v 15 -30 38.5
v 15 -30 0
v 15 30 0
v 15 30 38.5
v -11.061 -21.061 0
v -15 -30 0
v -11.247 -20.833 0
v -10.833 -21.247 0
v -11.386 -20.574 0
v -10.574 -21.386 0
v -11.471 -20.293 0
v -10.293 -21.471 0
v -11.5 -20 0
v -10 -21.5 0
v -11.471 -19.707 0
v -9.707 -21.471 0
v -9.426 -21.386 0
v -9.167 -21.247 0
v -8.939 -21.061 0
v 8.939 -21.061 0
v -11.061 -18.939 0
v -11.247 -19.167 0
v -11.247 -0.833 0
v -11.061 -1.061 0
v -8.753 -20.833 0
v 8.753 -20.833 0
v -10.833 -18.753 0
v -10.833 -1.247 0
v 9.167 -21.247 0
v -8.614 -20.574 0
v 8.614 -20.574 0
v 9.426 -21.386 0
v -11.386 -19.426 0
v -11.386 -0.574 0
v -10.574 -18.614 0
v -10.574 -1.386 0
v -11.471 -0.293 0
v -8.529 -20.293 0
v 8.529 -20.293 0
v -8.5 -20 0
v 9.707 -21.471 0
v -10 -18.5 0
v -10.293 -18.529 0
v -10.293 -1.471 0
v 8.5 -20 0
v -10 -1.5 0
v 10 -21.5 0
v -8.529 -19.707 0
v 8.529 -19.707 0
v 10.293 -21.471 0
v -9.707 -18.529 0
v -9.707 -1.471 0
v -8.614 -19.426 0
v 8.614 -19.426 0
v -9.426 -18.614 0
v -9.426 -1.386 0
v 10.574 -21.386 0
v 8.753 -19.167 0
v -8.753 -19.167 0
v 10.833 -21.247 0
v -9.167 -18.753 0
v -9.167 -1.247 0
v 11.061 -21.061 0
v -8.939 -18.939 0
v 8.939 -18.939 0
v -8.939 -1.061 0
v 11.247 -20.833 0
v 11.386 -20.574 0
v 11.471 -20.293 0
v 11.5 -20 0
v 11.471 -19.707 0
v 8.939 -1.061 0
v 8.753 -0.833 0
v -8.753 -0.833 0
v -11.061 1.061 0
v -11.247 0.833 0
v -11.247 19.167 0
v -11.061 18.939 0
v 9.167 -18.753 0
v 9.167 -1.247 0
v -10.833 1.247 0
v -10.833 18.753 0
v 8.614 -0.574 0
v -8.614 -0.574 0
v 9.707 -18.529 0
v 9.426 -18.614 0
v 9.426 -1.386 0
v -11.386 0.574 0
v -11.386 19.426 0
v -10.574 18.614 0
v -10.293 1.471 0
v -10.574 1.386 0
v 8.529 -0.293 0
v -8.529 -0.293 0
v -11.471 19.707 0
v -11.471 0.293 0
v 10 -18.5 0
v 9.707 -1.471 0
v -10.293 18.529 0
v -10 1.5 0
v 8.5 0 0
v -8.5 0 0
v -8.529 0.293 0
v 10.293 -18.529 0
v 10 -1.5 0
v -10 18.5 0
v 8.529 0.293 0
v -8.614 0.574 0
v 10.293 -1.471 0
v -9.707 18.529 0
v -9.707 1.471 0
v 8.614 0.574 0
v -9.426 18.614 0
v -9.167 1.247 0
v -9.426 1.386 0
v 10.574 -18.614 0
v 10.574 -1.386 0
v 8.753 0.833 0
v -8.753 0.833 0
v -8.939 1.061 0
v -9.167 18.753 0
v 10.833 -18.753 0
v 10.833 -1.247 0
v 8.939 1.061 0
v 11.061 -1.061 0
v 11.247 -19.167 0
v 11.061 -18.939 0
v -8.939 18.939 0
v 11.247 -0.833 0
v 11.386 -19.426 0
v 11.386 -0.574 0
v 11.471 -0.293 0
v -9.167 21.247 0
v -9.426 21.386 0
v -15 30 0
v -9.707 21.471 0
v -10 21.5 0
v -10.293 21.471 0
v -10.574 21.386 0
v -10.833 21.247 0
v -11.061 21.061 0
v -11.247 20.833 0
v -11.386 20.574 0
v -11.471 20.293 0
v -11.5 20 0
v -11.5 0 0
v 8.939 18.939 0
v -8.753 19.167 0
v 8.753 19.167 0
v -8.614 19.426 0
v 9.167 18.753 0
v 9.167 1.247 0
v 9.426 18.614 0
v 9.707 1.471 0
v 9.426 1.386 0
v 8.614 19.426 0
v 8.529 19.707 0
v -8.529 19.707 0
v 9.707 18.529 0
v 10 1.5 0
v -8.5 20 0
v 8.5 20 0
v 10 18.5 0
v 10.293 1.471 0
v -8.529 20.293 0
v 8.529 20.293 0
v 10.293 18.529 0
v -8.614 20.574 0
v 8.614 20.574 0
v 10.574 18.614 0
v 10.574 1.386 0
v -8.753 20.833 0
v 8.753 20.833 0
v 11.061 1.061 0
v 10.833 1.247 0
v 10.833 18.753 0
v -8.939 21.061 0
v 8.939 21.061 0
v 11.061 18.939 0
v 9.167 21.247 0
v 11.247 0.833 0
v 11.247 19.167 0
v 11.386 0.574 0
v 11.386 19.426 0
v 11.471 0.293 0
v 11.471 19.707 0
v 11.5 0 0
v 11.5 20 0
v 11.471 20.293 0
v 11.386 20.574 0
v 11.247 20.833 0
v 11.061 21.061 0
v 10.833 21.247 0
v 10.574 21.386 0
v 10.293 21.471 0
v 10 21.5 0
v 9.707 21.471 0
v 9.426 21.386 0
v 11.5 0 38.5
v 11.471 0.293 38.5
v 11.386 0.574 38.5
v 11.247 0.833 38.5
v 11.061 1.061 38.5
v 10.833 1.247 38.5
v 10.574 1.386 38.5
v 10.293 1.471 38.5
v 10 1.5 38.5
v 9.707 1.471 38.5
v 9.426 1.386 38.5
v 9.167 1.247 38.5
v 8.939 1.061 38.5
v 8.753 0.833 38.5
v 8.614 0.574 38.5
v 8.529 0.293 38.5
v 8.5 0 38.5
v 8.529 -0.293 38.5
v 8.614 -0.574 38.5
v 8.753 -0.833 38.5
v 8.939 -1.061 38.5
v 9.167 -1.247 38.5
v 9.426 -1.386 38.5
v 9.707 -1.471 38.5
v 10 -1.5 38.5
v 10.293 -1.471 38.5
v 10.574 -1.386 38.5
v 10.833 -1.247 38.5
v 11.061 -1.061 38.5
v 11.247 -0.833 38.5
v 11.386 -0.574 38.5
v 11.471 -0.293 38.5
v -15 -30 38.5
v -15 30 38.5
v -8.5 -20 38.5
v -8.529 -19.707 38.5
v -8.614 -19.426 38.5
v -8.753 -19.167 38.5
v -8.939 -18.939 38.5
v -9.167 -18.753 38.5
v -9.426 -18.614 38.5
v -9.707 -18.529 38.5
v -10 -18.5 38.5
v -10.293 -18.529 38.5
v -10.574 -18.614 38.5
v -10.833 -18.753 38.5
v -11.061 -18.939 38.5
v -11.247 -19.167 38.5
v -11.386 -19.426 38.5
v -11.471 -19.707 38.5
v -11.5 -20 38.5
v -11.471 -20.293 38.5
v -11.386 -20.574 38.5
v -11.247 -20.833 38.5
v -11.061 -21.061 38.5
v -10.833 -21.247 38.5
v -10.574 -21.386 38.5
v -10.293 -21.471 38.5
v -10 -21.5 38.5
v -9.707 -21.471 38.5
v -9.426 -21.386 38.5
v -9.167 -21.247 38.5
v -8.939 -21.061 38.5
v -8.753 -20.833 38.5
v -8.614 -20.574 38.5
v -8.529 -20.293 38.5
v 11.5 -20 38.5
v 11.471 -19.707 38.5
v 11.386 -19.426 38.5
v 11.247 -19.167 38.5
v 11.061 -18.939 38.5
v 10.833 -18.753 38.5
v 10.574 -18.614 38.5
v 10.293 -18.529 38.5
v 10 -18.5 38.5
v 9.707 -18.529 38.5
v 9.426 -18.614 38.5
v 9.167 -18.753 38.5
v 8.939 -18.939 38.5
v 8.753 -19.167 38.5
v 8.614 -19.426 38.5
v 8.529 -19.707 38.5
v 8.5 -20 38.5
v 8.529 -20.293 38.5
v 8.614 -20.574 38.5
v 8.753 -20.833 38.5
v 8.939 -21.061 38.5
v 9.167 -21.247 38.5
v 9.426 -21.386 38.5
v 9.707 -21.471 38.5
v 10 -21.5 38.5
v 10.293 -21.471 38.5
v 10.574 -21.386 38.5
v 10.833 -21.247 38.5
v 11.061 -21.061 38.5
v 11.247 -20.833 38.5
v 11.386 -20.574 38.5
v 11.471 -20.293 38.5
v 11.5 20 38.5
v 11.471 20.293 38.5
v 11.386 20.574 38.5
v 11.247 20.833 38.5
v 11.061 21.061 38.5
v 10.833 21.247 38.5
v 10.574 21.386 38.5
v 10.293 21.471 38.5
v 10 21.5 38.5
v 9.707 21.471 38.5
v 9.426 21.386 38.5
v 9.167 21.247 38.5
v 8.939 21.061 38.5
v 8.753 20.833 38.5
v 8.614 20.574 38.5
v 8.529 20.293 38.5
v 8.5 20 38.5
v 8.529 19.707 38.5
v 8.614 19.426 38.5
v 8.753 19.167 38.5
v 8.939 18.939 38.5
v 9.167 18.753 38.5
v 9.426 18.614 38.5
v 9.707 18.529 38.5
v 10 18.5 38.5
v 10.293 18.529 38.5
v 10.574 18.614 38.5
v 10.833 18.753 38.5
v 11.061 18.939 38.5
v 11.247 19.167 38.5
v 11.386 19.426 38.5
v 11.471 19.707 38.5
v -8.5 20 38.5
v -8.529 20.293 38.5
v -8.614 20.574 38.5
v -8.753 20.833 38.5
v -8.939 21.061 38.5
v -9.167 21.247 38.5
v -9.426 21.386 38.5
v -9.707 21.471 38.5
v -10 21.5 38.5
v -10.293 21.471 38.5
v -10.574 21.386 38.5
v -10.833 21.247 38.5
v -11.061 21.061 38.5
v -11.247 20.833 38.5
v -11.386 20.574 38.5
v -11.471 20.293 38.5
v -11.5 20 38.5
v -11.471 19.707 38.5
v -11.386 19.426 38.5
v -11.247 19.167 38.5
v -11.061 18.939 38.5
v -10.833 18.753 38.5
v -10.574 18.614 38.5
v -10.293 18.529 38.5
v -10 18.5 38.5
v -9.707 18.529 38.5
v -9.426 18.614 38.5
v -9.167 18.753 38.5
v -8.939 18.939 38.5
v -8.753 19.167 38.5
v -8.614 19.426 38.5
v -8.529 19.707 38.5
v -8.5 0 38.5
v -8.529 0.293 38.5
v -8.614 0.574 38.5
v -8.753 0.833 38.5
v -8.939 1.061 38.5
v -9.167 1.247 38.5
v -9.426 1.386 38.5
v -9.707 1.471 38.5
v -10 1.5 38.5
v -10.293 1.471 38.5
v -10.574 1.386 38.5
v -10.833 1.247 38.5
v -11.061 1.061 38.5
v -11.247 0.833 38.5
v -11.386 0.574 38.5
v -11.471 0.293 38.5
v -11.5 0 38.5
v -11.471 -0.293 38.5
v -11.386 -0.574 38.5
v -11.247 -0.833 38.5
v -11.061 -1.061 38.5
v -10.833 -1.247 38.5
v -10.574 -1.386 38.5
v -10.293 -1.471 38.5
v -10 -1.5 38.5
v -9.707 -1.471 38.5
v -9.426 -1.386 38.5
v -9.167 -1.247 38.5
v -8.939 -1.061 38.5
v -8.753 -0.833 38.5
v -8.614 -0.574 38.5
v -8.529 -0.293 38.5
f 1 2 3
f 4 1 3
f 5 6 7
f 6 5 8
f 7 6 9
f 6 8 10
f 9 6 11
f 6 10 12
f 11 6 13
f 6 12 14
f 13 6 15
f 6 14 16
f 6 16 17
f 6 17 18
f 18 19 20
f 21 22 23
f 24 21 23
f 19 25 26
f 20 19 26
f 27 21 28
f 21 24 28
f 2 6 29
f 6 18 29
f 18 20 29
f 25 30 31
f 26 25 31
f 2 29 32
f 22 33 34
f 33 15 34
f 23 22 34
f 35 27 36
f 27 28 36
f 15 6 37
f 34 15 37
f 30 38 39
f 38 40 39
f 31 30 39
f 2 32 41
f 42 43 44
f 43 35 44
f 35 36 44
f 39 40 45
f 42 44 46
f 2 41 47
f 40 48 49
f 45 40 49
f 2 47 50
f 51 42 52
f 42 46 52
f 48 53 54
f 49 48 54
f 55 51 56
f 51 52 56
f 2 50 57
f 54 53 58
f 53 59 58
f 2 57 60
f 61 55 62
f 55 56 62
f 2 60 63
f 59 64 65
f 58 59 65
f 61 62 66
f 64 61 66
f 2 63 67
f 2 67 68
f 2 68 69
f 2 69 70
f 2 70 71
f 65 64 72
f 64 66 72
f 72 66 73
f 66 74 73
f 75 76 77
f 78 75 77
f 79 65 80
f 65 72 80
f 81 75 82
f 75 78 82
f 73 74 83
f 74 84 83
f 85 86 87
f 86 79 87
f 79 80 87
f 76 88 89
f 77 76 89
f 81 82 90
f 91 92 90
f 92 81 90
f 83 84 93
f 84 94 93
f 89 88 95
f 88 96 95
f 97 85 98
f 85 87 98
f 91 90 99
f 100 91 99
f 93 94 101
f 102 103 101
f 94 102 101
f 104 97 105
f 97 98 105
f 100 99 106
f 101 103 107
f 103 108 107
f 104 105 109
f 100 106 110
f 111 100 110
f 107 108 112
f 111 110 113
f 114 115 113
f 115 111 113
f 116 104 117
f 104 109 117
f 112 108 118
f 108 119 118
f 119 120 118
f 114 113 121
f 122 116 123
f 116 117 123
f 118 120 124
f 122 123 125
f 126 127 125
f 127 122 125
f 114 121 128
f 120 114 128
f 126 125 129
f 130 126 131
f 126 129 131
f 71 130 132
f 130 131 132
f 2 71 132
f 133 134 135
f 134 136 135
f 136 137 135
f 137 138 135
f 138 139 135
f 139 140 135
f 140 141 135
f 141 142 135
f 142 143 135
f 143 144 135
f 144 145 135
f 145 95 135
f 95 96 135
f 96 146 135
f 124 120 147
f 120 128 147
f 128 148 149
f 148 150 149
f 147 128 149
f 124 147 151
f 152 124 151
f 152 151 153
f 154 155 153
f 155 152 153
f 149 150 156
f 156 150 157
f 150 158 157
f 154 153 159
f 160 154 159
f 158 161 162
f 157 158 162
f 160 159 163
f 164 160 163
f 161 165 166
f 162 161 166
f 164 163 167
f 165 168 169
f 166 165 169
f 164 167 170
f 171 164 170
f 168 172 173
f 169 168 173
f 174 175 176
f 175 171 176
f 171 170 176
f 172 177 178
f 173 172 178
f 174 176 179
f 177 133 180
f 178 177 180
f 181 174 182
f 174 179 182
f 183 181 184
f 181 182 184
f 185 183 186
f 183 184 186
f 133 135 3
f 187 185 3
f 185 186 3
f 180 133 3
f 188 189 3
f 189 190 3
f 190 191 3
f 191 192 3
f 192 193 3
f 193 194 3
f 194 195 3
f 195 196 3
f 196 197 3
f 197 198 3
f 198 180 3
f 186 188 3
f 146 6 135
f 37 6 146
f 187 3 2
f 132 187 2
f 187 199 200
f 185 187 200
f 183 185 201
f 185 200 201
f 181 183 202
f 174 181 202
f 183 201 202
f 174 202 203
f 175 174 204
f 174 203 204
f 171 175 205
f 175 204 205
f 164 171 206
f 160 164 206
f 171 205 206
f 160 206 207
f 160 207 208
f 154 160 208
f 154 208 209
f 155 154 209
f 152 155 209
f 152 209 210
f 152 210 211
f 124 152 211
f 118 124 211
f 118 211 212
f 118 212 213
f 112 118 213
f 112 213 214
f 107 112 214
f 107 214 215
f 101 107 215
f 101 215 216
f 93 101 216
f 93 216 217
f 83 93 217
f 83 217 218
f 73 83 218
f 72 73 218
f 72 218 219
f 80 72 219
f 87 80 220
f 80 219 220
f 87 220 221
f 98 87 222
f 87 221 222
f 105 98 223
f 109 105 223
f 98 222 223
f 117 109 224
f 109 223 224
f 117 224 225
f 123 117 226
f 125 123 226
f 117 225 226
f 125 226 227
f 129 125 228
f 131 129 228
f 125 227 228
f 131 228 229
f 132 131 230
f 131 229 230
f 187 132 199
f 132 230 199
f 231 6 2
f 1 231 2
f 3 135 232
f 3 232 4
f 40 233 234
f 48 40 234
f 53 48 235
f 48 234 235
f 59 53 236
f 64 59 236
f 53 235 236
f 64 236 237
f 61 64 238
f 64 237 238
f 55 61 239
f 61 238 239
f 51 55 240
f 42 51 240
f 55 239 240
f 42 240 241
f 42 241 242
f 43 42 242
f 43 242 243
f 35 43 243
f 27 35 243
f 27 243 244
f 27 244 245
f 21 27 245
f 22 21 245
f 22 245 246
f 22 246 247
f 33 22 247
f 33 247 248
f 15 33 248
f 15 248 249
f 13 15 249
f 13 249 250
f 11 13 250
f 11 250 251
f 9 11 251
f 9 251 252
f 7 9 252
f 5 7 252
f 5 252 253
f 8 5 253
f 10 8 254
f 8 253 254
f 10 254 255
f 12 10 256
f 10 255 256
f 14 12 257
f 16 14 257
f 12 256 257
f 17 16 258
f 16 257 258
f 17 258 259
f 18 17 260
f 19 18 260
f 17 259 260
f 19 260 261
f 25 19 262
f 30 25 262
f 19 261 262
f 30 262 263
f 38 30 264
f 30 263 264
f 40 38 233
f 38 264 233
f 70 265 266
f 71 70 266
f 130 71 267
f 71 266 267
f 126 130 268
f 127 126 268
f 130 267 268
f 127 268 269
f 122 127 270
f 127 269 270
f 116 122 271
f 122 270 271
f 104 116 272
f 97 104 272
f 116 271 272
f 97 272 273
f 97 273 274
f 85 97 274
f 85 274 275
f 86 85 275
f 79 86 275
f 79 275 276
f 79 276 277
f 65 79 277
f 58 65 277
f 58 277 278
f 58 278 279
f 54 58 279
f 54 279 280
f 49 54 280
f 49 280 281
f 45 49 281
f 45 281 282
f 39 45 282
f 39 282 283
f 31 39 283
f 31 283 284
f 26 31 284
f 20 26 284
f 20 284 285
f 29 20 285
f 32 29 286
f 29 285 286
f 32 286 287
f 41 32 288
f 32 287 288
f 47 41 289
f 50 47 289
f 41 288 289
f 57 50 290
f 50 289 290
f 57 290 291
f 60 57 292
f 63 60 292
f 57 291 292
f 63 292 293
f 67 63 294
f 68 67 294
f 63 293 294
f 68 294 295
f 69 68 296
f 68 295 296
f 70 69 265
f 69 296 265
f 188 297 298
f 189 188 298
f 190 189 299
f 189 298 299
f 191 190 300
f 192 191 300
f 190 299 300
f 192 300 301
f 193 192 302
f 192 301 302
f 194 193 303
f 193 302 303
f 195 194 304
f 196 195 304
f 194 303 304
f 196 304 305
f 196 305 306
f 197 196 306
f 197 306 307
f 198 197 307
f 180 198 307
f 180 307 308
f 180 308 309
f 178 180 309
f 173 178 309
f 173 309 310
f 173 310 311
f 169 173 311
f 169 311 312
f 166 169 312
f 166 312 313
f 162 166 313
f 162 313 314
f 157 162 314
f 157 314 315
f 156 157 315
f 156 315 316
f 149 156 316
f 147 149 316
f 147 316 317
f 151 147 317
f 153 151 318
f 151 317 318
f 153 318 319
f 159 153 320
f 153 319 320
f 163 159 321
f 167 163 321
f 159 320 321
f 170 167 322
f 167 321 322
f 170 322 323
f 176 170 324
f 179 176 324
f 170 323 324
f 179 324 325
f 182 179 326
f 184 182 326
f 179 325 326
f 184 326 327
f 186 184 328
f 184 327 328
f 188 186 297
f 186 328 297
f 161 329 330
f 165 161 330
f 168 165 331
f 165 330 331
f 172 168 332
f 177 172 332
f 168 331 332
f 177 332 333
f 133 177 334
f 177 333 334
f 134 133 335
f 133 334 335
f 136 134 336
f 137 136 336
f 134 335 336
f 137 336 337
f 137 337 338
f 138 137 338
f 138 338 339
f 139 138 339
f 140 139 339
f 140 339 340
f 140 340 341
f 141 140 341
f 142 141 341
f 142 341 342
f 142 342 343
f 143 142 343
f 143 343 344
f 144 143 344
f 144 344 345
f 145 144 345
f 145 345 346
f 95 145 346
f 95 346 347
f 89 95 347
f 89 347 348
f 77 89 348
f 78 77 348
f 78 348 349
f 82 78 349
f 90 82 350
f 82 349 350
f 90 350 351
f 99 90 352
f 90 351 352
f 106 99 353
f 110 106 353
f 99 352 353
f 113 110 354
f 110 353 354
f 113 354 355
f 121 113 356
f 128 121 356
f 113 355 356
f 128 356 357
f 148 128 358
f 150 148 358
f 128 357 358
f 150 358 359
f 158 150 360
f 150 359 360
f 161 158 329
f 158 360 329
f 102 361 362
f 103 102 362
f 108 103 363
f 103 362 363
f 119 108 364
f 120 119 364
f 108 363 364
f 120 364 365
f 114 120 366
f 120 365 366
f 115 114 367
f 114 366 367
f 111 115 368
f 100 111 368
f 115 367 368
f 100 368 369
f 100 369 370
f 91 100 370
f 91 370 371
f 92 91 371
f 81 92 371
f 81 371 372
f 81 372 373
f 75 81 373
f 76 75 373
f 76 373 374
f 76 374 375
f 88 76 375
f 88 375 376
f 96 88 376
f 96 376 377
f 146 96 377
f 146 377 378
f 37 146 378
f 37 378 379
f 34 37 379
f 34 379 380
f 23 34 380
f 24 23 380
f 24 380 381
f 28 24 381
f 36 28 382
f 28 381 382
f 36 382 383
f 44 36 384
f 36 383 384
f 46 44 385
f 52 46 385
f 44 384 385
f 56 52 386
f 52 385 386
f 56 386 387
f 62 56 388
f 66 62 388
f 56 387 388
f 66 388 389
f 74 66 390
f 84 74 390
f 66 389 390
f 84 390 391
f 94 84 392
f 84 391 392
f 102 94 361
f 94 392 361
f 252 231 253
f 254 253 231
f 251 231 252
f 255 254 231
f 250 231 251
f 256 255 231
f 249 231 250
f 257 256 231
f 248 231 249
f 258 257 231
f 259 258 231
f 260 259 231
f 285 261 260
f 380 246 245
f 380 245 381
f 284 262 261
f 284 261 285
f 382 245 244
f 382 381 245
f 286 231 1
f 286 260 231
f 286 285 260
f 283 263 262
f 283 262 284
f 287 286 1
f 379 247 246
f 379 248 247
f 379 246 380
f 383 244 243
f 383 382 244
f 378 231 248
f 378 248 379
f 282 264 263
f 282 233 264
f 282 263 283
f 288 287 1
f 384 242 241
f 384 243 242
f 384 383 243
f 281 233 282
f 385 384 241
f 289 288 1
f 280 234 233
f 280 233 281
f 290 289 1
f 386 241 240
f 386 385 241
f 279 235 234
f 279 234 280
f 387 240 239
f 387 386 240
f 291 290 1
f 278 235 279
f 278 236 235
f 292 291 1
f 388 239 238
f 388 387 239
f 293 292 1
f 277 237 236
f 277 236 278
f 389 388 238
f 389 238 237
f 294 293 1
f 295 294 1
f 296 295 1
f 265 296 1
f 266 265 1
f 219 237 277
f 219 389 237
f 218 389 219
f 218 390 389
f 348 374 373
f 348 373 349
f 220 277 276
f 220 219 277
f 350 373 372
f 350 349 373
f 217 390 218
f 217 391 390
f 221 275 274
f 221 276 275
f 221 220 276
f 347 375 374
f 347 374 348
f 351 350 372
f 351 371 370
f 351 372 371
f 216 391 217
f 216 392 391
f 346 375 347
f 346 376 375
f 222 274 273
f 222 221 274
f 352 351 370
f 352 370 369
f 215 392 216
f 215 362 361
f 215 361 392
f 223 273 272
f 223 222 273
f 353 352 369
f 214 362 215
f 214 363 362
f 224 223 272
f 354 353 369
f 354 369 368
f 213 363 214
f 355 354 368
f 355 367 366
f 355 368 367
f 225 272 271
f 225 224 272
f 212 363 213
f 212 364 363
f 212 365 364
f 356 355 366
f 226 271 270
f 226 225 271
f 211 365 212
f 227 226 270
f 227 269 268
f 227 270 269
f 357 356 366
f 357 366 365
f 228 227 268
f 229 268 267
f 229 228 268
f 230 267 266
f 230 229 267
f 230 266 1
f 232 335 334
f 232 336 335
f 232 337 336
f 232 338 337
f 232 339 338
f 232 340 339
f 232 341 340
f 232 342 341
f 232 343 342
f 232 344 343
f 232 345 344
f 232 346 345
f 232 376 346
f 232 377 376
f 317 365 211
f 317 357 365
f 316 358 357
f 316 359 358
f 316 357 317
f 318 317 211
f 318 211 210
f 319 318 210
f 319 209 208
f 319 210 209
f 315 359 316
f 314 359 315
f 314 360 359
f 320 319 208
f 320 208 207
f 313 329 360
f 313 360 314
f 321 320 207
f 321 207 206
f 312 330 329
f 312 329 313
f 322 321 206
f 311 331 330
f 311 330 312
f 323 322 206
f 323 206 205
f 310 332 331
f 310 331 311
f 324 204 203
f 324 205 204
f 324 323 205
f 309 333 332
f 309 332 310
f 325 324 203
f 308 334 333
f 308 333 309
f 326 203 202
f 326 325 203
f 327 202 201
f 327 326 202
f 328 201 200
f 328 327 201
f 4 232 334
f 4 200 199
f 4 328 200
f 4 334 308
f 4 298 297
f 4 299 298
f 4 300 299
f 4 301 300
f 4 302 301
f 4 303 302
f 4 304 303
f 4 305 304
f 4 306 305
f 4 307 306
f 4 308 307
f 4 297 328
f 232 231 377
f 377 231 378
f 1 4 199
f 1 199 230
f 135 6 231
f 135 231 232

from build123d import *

# Parameters (mm, degrees)
ESQUISSE1_W                     = 30
ESQUISSE1_H                     = 60
EXTRUSION1_DEPTH                = 38.5
ESQUISSE2_R                     = 1.5
EXTRUSION2_DEPTH                = 52.061237744
R_P_TITION_LIN_AIRE1_COUNT      = 3
R_P_TITION_LIN_AIRE1_PITCH      = 20
R_P_TITION_LIN_AIRE1_COUNT_DIR2 = 2
R_P_TITION_LIN_AIRE1_PITCH_DIR2 = 20


with BuildPart() as part:
    # Esquisse1 → Extrusion1 (new body)
    with BuildSketch(Plane.XY):
        Rectangle(ESQUISSE1_W, ESQUISSE1_H)
    extrude(amount=EXTRUSION1_DEPTH)

    # Esquisse2 → Extrusion2 (cut, through all)
    with BuildSketch(Plane.XY.offset(38.5)):
        with Locations((-10, 20)):
            Circle(ESQUISSE2_R)
    extrusion2 = extrude(amount=-EXTRUSION2_DEPTH, mode=Mode.SUBTRACT)

    # Répétition linéaire1: Extrusion2 3 × 2
    with Locations(*[(j * R_P_TITION_LIN_AIRE1_PITCH_DIR2, -i * R_P_TITION_LIN_AIRE1_PITCH, 0) for i in range(R_P_TITION_LIN_AIRE1_COUNT) for j in range(R_P_TITION_LIN_AIRE1_COUNT_DIR2) if (i, j) != (0, 0)]):
        add(extrusion2, mode=Mode.SUBTRACT)


solid = part.part
